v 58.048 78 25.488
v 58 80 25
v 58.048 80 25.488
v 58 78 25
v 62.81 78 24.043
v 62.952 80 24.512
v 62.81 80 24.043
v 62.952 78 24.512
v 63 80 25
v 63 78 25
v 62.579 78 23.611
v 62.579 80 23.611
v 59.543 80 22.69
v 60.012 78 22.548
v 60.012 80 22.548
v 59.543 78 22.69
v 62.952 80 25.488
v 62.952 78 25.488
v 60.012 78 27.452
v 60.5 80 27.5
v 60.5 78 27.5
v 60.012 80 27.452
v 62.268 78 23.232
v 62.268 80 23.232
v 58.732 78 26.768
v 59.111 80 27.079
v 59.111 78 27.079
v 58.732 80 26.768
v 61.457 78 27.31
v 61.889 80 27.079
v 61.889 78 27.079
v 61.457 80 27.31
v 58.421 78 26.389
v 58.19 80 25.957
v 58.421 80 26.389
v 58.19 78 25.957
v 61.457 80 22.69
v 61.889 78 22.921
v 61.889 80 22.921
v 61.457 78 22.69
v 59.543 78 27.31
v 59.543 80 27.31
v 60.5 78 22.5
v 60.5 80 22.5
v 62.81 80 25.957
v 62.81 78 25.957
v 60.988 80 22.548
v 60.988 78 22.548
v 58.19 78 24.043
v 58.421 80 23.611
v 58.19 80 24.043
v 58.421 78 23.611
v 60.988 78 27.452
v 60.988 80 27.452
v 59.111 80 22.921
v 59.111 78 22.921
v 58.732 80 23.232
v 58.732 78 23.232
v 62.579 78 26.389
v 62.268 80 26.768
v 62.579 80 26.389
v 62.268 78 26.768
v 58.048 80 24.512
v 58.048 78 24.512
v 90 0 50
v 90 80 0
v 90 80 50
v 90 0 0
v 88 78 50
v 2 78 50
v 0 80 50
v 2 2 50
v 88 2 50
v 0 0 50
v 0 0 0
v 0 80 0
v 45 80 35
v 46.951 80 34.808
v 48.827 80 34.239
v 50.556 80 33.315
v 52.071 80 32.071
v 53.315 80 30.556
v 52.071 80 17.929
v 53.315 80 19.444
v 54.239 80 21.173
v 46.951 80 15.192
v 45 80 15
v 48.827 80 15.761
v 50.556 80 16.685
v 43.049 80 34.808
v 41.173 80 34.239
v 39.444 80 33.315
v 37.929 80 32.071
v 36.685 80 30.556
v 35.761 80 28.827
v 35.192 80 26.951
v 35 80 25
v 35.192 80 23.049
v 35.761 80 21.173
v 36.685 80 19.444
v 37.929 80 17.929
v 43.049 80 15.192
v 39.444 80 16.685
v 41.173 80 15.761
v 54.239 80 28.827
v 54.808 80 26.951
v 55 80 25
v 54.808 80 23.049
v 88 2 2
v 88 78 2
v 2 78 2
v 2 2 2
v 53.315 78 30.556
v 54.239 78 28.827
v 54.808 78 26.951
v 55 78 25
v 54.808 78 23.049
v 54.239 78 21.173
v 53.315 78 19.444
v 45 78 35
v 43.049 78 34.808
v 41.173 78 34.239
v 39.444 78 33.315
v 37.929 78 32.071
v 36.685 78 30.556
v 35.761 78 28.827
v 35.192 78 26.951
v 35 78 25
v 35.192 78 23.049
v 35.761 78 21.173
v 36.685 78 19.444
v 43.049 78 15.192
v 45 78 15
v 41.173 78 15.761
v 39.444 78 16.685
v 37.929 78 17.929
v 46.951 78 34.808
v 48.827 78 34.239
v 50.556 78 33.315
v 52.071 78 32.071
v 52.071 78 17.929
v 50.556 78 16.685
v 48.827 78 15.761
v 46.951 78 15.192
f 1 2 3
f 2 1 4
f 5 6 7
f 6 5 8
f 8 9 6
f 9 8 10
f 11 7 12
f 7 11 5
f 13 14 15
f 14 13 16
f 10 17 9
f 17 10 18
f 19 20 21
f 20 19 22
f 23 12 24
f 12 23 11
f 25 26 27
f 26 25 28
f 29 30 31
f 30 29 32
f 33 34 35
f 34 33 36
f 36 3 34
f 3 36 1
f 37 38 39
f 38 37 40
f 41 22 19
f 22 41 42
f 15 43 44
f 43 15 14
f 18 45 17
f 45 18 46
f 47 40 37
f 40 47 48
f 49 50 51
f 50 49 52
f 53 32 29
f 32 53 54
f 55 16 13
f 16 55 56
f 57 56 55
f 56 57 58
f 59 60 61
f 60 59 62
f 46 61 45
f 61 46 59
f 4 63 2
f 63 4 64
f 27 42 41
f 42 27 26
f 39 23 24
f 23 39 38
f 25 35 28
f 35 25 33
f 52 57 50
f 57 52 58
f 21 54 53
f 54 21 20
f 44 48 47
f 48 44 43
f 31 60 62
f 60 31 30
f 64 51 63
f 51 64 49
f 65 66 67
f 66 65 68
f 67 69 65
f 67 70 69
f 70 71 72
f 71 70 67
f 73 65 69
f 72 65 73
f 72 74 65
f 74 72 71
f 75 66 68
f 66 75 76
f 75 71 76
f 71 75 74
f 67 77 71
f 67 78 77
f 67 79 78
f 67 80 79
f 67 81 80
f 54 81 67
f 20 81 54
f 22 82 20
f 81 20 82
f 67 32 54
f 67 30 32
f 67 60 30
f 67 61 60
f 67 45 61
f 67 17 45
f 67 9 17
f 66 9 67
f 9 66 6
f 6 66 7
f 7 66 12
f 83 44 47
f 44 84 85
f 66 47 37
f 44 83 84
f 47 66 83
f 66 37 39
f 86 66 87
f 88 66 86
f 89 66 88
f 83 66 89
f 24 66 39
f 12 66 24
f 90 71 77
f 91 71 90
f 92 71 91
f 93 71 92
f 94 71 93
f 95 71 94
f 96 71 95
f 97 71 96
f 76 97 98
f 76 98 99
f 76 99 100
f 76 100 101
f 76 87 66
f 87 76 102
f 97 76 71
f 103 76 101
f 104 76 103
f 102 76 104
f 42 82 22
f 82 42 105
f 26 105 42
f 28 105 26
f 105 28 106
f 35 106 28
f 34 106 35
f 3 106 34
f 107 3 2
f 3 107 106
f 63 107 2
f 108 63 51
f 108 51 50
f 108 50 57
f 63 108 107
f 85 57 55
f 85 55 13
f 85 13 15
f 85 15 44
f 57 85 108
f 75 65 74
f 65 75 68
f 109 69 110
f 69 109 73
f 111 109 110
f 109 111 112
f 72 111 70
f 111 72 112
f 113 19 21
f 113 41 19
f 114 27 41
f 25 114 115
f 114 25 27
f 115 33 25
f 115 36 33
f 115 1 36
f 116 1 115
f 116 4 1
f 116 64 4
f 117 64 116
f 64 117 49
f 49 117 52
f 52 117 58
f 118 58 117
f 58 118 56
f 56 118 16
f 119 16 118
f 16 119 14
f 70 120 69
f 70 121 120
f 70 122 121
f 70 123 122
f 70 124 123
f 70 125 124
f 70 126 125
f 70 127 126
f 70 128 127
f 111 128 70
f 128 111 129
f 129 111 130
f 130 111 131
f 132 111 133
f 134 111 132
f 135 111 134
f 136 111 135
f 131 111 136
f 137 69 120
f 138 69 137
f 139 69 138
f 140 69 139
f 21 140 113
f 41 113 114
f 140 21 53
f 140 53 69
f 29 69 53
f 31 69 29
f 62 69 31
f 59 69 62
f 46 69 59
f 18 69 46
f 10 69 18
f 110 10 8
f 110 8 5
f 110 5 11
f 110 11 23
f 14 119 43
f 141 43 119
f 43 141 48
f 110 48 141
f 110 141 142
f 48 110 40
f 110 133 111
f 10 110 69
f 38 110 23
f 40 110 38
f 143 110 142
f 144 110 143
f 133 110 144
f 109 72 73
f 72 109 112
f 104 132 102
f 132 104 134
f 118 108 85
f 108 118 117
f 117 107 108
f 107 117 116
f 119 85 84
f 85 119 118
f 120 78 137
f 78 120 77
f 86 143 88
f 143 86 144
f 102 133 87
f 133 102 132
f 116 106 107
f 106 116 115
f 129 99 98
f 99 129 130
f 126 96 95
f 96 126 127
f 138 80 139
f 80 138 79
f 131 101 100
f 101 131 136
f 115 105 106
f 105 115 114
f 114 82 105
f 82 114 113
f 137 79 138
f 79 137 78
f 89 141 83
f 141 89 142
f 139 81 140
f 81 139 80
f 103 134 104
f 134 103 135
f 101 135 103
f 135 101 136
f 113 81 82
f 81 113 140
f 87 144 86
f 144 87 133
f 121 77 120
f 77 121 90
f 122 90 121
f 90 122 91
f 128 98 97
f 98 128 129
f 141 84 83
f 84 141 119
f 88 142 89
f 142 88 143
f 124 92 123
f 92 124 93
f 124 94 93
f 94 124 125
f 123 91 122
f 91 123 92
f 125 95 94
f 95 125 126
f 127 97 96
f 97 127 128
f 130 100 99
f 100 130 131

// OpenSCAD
$fn = 32;

// ----------------------------------------------------------------------
// Vent box: roundvent enclosure
// ----------------------------------------------------------------------

// --- parameters (mm) ---
box_l = 90;               // box length, X
box_w = 80;               // box width, Y
box_h = 50;               // box height, Z
wall_t = 2;               // shell wall thickness
vent_d = 20;              // central vent diameter
ring_d = 5;               // ring hole diameter
n_ring = 6;               // holes in the ring
ring_r = 15.5;            // ring radius

ring_step = 360 / n_ring;  // ring hole angular step

difference() {
  cube([box_l, box_w, box_h]);
  translate([wall_t, wall_t, wall_t])
    cube([box_l - 2 * wall_t, box_w - 2 * wall_t, box_h]);
  translate([box_l / 2, box_w - wall_t - 1, box_h / 2])
    rotate([-90, 0, 0]) cylinder(h = wall_t + 2, d = vent_d);
  for (i = [0 : n_ring - 1])
    translate([box_l / 2, box_w - wall_t - 1, box_h / 2])
      rotate([0, 0, i * ring_step])
        translate([ring_r, 0, 0]) rotate([-90, 0, 0])
          cylinder(h = wall_t + 2, d = ring_d);
}
